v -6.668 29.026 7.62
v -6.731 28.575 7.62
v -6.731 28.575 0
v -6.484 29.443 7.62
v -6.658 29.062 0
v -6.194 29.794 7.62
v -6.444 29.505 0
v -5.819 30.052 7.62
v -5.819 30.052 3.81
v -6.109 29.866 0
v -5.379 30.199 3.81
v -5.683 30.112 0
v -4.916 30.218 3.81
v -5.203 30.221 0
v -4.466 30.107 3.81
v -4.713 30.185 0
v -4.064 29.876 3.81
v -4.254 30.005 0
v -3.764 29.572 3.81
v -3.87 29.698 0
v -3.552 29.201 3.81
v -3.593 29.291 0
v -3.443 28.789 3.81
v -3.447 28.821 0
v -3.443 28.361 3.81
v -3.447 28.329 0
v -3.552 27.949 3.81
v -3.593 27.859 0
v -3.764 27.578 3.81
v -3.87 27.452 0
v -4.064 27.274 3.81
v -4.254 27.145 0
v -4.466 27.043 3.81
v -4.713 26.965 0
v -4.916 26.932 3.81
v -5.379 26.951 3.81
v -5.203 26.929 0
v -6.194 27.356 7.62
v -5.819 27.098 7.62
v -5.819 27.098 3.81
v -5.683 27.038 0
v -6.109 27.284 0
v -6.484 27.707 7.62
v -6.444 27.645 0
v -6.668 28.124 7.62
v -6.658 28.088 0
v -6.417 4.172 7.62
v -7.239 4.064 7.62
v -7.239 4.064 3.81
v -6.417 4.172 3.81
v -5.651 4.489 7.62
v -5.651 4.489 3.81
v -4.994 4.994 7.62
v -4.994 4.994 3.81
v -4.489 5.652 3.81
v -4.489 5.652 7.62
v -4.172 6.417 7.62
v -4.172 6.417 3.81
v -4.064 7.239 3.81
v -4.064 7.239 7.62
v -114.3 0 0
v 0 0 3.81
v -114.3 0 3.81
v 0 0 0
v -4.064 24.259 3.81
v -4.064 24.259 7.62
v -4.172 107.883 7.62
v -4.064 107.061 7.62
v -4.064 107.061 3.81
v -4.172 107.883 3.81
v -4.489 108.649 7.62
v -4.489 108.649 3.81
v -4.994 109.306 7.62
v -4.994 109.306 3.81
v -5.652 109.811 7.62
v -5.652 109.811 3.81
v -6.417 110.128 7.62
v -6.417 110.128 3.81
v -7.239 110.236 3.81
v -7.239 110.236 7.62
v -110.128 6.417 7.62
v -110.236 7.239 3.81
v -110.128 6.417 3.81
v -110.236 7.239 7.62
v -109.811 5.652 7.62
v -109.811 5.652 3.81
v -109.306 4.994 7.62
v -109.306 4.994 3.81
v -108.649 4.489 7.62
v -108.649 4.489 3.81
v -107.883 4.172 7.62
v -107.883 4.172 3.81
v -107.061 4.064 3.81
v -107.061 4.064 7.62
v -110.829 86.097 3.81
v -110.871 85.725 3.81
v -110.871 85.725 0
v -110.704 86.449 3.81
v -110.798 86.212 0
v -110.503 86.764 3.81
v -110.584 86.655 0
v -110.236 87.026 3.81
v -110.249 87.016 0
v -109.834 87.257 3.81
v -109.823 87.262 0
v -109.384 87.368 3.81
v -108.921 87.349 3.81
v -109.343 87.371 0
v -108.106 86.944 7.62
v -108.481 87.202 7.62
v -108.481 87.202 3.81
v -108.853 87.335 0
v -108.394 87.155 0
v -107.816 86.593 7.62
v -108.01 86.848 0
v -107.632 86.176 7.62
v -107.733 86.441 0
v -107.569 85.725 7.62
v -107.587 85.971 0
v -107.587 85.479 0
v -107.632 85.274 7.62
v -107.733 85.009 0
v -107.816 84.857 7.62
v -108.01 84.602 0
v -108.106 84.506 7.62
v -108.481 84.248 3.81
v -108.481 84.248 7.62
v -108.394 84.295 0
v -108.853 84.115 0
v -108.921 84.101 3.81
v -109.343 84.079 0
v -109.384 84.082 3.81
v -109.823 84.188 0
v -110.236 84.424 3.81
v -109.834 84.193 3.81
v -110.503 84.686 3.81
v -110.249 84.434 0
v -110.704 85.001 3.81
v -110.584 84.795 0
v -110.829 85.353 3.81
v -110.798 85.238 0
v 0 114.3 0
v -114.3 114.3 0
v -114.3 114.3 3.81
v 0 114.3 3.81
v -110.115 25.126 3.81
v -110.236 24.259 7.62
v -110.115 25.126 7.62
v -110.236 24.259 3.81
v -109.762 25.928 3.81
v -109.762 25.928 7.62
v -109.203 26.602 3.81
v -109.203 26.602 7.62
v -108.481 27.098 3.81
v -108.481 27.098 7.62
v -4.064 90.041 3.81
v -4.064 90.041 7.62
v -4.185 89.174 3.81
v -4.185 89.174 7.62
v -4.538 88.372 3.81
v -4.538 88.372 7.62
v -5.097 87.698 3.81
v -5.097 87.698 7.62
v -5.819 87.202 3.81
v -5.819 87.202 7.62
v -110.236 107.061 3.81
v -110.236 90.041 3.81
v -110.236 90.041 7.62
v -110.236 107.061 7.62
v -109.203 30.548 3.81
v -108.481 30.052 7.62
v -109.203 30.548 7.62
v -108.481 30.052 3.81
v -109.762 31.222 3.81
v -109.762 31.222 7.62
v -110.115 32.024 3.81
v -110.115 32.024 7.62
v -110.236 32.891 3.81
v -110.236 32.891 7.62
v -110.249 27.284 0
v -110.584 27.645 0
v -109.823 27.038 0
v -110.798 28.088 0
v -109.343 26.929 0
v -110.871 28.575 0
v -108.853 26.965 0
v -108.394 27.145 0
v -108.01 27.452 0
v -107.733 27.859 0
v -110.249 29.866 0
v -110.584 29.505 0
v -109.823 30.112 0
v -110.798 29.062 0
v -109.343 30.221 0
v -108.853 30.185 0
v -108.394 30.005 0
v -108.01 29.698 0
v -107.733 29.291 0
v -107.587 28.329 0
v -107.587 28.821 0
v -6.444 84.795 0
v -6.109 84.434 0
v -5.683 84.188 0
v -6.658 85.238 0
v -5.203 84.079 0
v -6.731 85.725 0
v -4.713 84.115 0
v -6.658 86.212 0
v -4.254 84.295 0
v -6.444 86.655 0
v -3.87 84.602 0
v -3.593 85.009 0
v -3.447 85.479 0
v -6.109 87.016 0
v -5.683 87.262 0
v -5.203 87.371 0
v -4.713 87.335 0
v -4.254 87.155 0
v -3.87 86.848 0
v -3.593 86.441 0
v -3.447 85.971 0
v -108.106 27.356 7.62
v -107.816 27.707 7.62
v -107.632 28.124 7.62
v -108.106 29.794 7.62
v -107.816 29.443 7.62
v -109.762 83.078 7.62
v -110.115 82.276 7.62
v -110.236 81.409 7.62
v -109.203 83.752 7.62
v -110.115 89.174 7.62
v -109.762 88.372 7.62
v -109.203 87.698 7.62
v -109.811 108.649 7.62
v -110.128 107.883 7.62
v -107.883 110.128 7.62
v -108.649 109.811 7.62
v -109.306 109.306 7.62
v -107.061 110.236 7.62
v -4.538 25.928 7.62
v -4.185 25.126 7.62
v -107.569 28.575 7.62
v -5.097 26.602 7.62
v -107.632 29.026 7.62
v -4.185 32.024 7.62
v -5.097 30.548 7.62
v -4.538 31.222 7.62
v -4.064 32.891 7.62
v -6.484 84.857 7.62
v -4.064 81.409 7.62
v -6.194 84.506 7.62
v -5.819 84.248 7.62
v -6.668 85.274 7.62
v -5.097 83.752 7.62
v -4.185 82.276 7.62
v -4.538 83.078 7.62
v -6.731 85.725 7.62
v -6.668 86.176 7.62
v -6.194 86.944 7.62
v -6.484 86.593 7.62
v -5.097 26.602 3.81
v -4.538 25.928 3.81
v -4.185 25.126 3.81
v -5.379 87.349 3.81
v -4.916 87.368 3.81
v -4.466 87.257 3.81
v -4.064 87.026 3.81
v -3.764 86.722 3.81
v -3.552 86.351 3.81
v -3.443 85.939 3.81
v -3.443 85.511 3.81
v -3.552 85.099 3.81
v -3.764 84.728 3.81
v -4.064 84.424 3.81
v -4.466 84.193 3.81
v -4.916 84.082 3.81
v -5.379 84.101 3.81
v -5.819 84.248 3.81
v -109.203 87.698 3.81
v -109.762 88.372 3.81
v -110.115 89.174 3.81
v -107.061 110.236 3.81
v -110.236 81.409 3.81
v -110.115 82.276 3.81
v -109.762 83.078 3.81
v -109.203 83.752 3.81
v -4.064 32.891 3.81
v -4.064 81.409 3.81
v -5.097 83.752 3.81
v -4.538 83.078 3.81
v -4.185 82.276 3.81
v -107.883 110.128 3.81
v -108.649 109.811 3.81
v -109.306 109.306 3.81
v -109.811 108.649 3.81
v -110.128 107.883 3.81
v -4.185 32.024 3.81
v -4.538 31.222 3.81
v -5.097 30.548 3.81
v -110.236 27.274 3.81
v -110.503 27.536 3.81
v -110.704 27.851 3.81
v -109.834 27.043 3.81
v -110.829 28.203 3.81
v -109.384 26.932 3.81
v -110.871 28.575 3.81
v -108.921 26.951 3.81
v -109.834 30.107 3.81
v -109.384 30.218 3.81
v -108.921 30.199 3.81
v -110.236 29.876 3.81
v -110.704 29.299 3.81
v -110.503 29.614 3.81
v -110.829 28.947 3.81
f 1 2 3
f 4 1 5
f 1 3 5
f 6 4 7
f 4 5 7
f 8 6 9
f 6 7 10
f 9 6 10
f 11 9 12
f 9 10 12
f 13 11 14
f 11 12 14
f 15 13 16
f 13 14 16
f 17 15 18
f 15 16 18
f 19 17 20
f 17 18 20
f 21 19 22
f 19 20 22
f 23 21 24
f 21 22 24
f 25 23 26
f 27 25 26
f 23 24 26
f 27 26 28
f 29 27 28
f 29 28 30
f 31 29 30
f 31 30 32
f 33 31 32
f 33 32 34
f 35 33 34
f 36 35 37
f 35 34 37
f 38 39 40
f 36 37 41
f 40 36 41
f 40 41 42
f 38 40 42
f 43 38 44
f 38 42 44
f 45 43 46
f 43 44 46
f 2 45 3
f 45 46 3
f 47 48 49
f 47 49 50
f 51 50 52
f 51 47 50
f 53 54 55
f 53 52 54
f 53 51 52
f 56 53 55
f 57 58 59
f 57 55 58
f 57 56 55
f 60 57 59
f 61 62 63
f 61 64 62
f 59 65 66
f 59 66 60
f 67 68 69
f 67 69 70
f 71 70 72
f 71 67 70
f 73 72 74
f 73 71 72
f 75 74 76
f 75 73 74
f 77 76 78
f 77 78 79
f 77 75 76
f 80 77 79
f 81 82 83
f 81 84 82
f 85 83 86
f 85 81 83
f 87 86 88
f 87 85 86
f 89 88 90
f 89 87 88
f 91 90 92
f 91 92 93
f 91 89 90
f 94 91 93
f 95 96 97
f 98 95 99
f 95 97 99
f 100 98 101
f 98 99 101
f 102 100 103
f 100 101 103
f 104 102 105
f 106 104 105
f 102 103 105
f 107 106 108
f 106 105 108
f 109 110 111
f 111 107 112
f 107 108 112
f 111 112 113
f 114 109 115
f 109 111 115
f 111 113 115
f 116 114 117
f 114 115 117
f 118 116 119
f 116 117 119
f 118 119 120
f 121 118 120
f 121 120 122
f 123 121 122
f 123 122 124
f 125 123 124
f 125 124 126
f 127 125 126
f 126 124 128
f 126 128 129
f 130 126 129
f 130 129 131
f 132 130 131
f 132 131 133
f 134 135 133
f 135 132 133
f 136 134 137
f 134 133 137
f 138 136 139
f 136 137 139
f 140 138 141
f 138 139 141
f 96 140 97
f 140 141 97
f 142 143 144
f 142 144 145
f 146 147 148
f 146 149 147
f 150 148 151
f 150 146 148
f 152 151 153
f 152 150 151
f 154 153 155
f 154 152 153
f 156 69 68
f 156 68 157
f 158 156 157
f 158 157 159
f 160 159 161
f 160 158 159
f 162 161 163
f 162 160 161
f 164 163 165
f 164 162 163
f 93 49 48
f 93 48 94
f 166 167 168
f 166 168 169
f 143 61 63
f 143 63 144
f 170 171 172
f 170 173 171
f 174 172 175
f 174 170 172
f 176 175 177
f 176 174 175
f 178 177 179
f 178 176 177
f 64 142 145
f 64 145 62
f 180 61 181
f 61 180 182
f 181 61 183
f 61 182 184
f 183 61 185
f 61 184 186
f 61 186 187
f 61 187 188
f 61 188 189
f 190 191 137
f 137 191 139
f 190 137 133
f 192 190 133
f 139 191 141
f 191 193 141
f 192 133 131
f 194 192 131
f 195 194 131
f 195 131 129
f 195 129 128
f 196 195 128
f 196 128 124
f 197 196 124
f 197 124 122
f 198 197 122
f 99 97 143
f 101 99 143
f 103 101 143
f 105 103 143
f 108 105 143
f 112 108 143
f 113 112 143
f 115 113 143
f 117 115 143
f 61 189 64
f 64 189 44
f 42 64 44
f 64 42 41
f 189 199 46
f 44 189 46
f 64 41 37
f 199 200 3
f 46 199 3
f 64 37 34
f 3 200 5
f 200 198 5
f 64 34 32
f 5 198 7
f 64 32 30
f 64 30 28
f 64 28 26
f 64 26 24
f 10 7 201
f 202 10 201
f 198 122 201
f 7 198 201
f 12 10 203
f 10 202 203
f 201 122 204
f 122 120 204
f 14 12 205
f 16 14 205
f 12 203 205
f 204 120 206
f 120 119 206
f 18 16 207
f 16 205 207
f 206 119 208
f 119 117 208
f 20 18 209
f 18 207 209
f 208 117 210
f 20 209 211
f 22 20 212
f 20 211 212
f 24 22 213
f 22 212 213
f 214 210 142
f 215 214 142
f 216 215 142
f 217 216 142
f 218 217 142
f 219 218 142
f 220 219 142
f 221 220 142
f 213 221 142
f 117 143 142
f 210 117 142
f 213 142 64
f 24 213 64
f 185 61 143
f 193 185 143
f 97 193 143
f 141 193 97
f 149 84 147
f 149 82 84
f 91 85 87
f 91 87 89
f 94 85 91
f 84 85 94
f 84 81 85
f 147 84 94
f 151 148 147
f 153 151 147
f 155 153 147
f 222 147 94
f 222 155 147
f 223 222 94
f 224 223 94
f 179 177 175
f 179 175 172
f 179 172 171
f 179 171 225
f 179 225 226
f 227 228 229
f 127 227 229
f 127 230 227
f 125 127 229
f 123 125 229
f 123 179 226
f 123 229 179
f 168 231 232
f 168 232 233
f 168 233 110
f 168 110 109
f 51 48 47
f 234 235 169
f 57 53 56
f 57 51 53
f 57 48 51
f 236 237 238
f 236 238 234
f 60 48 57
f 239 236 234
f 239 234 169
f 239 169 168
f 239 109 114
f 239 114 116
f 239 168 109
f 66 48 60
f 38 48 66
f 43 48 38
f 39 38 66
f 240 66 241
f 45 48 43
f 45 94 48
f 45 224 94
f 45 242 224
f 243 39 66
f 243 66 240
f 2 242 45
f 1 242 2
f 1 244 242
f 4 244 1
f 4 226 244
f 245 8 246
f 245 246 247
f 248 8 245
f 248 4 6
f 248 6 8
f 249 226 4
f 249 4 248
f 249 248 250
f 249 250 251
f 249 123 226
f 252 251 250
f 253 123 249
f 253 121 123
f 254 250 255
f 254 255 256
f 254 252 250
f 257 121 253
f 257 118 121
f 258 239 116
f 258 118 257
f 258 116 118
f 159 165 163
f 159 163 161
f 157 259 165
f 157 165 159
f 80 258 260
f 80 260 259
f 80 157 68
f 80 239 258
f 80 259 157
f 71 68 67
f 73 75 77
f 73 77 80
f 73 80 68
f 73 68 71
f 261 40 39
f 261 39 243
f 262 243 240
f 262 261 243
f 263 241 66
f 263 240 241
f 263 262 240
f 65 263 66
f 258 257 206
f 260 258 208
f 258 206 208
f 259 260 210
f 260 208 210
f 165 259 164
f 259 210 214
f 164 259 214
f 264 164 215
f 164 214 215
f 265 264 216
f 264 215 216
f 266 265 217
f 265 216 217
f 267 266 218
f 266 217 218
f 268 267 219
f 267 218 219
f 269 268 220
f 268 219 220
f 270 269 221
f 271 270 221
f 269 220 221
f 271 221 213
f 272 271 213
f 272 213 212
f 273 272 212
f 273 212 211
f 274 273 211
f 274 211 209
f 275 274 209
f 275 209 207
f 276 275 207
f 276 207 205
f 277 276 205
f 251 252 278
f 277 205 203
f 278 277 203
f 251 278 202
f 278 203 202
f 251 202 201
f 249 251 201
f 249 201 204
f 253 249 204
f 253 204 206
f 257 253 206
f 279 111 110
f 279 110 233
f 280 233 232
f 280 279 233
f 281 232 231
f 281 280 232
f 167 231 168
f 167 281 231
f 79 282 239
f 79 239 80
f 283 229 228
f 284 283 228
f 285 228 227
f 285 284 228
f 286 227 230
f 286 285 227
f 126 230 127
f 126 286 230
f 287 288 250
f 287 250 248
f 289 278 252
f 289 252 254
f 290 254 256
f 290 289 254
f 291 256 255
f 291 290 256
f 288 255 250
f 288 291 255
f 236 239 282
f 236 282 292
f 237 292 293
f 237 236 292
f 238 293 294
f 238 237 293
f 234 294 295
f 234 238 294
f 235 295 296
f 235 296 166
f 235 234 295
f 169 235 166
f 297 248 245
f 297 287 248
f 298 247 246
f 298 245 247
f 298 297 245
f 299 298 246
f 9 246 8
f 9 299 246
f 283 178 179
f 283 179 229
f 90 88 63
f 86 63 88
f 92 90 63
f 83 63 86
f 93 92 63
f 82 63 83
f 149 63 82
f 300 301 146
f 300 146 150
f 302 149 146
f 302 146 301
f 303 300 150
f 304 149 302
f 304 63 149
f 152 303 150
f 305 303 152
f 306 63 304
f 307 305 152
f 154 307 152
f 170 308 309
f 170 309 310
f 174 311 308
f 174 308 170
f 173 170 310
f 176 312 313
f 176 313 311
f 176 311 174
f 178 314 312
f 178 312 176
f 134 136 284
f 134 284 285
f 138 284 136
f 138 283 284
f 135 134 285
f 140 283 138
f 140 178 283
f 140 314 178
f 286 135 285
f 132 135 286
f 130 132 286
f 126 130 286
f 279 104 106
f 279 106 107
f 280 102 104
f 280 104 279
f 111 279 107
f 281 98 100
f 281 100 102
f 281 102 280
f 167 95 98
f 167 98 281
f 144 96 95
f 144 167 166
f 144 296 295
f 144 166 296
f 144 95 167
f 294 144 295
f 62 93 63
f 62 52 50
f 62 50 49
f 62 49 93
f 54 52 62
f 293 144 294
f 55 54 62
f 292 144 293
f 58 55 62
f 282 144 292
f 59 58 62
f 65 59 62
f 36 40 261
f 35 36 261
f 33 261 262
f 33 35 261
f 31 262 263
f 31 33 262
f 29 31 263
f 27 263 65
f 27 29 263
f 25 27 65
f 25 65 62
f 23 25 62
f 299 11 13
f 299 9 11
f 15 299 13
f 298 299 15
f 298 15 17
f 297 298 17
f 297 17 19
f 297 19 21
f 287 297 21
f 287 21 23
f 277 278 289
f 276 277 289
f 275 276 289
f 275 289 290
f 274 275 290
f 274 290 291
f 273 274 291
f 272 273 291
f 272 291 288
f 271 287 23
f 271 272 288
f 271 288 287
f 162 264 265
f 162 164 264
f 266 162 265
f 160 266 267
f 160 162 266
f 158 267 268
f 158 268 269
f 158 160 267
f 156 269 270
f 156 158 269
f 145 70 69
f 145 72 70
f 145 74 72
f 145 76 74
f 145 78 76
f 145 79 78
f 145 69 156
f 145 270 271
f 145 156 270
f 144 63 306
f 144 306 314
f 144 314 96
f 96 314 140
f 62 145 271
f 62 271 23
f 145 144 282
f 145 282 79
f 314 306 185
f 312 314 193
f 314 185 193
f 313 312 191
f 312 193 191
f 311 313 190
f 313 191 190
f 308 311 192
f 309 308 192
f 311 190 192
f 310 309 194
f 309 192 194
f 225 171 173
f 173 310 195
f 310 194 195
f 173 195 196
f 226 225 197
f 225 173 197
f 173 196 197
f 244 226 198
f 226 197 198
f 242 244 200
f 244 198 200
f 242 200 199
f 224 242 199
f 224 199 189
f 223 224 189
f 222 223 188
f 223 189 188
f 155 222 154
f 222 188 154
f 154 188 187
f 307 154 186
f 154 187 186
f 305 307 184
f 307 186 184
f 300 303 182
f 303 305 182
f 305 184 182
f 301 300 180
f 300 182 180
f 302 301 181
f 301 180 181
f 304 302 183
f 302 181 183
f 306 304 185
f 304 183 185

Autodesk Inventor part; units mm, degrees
ref_plane "YZ Plane" through (0, 0, 0) normal (1, 0, 0) x (0, 1, 0)
ref_plane "XZ Plane" through (0, 0, 0) normal (0, 1, 0) x (-1, 0, 0)
ref_plane "XY Plane" through (0, 0, 0) normal (0, 0, 1) x (1, 0, 0)
sketch "Sketch1" plane through (0, 0, 0) normal (0, 0, 1) x (1, 0, 0)
  line L0 (0, 0) -> (-114.3, 0)
  line L1 (-114.3, 0) -> (-114.3, 114.3)
  line L2 (-114.3, 114.3) -> (0, 114.3)
  line L3 (0, 114.3) -> (0, 0)
  line L4 (-3.81, 3.81) -> (-110.49, 3.81)
  line L5 (-110.49, 3.81) -> (-110.49, 110.49)
  line L6 (-110.49, 110.49) -> (-3.81, 110.49)
  line L7 (-3.81, 110.49) -> (-3.81, 3.81)
  dimension "d0" = 3.81
  dimension "d1" = 3.81
  dimension "d2" = 3.81
  dimension "d3" = 3.81
  dimension "d4" = 114.3
  dimension "d5" = 114.3
extrude "Extrusion1" add sketch "Sketch1" along normal blind 3.81 contours L0 L1 L2 L3 | L4 L5 L6 L7
sketch "Sketch2" plane through (0, 0, 3.81) normal (0, 0, 1) x (1, 0, 0)
  line L0 (-4.064, 4.064) -> (-110.236, 4.064)
  line L1 (-110.236, 4.064) -> (-110.236, 110.236)
  line L2 (-110.236, 110.236) -> (-4.064, 110.236)
  line L3 (-4.064, 110.236) -> (-4.064, 4.064)
  line L4 (-114.3, 114.3) -> (-114.3, 0) projected
  line L5 (0, 114.3) -> (-114.3, 114.3) projected
  line L6 (0, 0) -> (0, 114.3) projected
  line L7 (-114.3, 0) -> (0, 0) projected
  dimension "d8" = 4.064
  dimension "d9" = 4.064
  dimension "d10" = 4.064
  dimension "d11" = 4.064
extrude "Extrusion2" add sketch "Sketch2" along normal blind 3.81 contours L0 L1 L2 L3
fillet "Fillet1" radius 3.175 4 edges at (-4.064, 110.236, 5.715) (-110.236, 110.236, 5.715) (-110.236, 4.064, 5.715) (-4.064, 4.064, 5.715)
sketch "Sketch3" plane through (0, 0, 0) normal (0, 0, -1) x (-1, 0, 0)
  circle A0 centre (109.22, 85.725) radius 1.651
  circle A1 centre (109.22, 28.575) radius 1.651
  line L0 (114.3, 0) -> (114.3, 114.3)
  line L1 (114.3, 114.3) -> (0, 114.3)
  circle A2 centre (5.08, 85.725) radius 1.651
  circle A3 centre (5.08, 28.575) radius 1.651
  line L2 (0, 114.3) -> (0, 0)
  line L3 (0, 0) -> (114.3, 0)
  dimension "d15" = 3.302
  dimension "d16" = 57.15
  dimension "d17" = 57.15
  dimension "d18" = 104.14
  dimension "d19" = 104.14
  dimension "d20" = 28.575
  dimension "d21" = 114.3
  dimension "d22" = 5.08
  dimension "d23" = 5.08
  dimension "d24" = 5.08
  dimension "d37" = 114.3
  dimension "d38" = 114.3
  dimension "d39" = 114.3
  dimension "d40" = 114.3
extrude "Extrusion3" cut sketch "Sketch3" against normal up to surface (7.62 mm away) contours A0 | A1 | A2 | A3
fillet "Fillet2" radius 3.175 8 edges at (-4.064, 27.2736, 5.715) (-4.064, 29.8764, 5.715) (-4.064, 84.4236, 5.715) (-4.064, 87.0264, 5.715) (-110.236, 87.0264, 5.715) (-110.236, 84.4236, 5.715) (-110.236, 29.8764, 5.715) (-110.236, 27.2736, 5.715)
equation "\"d1\" = d0"
equation "\"d2\" = d0"
equation "\"d3\" = d0"
equation "\"d16\" = d17"
equation "\"d19\" = d18"
equation "\"d23\" = d22"
equation "\"d24\" = d22"
properties part number "Lid"
